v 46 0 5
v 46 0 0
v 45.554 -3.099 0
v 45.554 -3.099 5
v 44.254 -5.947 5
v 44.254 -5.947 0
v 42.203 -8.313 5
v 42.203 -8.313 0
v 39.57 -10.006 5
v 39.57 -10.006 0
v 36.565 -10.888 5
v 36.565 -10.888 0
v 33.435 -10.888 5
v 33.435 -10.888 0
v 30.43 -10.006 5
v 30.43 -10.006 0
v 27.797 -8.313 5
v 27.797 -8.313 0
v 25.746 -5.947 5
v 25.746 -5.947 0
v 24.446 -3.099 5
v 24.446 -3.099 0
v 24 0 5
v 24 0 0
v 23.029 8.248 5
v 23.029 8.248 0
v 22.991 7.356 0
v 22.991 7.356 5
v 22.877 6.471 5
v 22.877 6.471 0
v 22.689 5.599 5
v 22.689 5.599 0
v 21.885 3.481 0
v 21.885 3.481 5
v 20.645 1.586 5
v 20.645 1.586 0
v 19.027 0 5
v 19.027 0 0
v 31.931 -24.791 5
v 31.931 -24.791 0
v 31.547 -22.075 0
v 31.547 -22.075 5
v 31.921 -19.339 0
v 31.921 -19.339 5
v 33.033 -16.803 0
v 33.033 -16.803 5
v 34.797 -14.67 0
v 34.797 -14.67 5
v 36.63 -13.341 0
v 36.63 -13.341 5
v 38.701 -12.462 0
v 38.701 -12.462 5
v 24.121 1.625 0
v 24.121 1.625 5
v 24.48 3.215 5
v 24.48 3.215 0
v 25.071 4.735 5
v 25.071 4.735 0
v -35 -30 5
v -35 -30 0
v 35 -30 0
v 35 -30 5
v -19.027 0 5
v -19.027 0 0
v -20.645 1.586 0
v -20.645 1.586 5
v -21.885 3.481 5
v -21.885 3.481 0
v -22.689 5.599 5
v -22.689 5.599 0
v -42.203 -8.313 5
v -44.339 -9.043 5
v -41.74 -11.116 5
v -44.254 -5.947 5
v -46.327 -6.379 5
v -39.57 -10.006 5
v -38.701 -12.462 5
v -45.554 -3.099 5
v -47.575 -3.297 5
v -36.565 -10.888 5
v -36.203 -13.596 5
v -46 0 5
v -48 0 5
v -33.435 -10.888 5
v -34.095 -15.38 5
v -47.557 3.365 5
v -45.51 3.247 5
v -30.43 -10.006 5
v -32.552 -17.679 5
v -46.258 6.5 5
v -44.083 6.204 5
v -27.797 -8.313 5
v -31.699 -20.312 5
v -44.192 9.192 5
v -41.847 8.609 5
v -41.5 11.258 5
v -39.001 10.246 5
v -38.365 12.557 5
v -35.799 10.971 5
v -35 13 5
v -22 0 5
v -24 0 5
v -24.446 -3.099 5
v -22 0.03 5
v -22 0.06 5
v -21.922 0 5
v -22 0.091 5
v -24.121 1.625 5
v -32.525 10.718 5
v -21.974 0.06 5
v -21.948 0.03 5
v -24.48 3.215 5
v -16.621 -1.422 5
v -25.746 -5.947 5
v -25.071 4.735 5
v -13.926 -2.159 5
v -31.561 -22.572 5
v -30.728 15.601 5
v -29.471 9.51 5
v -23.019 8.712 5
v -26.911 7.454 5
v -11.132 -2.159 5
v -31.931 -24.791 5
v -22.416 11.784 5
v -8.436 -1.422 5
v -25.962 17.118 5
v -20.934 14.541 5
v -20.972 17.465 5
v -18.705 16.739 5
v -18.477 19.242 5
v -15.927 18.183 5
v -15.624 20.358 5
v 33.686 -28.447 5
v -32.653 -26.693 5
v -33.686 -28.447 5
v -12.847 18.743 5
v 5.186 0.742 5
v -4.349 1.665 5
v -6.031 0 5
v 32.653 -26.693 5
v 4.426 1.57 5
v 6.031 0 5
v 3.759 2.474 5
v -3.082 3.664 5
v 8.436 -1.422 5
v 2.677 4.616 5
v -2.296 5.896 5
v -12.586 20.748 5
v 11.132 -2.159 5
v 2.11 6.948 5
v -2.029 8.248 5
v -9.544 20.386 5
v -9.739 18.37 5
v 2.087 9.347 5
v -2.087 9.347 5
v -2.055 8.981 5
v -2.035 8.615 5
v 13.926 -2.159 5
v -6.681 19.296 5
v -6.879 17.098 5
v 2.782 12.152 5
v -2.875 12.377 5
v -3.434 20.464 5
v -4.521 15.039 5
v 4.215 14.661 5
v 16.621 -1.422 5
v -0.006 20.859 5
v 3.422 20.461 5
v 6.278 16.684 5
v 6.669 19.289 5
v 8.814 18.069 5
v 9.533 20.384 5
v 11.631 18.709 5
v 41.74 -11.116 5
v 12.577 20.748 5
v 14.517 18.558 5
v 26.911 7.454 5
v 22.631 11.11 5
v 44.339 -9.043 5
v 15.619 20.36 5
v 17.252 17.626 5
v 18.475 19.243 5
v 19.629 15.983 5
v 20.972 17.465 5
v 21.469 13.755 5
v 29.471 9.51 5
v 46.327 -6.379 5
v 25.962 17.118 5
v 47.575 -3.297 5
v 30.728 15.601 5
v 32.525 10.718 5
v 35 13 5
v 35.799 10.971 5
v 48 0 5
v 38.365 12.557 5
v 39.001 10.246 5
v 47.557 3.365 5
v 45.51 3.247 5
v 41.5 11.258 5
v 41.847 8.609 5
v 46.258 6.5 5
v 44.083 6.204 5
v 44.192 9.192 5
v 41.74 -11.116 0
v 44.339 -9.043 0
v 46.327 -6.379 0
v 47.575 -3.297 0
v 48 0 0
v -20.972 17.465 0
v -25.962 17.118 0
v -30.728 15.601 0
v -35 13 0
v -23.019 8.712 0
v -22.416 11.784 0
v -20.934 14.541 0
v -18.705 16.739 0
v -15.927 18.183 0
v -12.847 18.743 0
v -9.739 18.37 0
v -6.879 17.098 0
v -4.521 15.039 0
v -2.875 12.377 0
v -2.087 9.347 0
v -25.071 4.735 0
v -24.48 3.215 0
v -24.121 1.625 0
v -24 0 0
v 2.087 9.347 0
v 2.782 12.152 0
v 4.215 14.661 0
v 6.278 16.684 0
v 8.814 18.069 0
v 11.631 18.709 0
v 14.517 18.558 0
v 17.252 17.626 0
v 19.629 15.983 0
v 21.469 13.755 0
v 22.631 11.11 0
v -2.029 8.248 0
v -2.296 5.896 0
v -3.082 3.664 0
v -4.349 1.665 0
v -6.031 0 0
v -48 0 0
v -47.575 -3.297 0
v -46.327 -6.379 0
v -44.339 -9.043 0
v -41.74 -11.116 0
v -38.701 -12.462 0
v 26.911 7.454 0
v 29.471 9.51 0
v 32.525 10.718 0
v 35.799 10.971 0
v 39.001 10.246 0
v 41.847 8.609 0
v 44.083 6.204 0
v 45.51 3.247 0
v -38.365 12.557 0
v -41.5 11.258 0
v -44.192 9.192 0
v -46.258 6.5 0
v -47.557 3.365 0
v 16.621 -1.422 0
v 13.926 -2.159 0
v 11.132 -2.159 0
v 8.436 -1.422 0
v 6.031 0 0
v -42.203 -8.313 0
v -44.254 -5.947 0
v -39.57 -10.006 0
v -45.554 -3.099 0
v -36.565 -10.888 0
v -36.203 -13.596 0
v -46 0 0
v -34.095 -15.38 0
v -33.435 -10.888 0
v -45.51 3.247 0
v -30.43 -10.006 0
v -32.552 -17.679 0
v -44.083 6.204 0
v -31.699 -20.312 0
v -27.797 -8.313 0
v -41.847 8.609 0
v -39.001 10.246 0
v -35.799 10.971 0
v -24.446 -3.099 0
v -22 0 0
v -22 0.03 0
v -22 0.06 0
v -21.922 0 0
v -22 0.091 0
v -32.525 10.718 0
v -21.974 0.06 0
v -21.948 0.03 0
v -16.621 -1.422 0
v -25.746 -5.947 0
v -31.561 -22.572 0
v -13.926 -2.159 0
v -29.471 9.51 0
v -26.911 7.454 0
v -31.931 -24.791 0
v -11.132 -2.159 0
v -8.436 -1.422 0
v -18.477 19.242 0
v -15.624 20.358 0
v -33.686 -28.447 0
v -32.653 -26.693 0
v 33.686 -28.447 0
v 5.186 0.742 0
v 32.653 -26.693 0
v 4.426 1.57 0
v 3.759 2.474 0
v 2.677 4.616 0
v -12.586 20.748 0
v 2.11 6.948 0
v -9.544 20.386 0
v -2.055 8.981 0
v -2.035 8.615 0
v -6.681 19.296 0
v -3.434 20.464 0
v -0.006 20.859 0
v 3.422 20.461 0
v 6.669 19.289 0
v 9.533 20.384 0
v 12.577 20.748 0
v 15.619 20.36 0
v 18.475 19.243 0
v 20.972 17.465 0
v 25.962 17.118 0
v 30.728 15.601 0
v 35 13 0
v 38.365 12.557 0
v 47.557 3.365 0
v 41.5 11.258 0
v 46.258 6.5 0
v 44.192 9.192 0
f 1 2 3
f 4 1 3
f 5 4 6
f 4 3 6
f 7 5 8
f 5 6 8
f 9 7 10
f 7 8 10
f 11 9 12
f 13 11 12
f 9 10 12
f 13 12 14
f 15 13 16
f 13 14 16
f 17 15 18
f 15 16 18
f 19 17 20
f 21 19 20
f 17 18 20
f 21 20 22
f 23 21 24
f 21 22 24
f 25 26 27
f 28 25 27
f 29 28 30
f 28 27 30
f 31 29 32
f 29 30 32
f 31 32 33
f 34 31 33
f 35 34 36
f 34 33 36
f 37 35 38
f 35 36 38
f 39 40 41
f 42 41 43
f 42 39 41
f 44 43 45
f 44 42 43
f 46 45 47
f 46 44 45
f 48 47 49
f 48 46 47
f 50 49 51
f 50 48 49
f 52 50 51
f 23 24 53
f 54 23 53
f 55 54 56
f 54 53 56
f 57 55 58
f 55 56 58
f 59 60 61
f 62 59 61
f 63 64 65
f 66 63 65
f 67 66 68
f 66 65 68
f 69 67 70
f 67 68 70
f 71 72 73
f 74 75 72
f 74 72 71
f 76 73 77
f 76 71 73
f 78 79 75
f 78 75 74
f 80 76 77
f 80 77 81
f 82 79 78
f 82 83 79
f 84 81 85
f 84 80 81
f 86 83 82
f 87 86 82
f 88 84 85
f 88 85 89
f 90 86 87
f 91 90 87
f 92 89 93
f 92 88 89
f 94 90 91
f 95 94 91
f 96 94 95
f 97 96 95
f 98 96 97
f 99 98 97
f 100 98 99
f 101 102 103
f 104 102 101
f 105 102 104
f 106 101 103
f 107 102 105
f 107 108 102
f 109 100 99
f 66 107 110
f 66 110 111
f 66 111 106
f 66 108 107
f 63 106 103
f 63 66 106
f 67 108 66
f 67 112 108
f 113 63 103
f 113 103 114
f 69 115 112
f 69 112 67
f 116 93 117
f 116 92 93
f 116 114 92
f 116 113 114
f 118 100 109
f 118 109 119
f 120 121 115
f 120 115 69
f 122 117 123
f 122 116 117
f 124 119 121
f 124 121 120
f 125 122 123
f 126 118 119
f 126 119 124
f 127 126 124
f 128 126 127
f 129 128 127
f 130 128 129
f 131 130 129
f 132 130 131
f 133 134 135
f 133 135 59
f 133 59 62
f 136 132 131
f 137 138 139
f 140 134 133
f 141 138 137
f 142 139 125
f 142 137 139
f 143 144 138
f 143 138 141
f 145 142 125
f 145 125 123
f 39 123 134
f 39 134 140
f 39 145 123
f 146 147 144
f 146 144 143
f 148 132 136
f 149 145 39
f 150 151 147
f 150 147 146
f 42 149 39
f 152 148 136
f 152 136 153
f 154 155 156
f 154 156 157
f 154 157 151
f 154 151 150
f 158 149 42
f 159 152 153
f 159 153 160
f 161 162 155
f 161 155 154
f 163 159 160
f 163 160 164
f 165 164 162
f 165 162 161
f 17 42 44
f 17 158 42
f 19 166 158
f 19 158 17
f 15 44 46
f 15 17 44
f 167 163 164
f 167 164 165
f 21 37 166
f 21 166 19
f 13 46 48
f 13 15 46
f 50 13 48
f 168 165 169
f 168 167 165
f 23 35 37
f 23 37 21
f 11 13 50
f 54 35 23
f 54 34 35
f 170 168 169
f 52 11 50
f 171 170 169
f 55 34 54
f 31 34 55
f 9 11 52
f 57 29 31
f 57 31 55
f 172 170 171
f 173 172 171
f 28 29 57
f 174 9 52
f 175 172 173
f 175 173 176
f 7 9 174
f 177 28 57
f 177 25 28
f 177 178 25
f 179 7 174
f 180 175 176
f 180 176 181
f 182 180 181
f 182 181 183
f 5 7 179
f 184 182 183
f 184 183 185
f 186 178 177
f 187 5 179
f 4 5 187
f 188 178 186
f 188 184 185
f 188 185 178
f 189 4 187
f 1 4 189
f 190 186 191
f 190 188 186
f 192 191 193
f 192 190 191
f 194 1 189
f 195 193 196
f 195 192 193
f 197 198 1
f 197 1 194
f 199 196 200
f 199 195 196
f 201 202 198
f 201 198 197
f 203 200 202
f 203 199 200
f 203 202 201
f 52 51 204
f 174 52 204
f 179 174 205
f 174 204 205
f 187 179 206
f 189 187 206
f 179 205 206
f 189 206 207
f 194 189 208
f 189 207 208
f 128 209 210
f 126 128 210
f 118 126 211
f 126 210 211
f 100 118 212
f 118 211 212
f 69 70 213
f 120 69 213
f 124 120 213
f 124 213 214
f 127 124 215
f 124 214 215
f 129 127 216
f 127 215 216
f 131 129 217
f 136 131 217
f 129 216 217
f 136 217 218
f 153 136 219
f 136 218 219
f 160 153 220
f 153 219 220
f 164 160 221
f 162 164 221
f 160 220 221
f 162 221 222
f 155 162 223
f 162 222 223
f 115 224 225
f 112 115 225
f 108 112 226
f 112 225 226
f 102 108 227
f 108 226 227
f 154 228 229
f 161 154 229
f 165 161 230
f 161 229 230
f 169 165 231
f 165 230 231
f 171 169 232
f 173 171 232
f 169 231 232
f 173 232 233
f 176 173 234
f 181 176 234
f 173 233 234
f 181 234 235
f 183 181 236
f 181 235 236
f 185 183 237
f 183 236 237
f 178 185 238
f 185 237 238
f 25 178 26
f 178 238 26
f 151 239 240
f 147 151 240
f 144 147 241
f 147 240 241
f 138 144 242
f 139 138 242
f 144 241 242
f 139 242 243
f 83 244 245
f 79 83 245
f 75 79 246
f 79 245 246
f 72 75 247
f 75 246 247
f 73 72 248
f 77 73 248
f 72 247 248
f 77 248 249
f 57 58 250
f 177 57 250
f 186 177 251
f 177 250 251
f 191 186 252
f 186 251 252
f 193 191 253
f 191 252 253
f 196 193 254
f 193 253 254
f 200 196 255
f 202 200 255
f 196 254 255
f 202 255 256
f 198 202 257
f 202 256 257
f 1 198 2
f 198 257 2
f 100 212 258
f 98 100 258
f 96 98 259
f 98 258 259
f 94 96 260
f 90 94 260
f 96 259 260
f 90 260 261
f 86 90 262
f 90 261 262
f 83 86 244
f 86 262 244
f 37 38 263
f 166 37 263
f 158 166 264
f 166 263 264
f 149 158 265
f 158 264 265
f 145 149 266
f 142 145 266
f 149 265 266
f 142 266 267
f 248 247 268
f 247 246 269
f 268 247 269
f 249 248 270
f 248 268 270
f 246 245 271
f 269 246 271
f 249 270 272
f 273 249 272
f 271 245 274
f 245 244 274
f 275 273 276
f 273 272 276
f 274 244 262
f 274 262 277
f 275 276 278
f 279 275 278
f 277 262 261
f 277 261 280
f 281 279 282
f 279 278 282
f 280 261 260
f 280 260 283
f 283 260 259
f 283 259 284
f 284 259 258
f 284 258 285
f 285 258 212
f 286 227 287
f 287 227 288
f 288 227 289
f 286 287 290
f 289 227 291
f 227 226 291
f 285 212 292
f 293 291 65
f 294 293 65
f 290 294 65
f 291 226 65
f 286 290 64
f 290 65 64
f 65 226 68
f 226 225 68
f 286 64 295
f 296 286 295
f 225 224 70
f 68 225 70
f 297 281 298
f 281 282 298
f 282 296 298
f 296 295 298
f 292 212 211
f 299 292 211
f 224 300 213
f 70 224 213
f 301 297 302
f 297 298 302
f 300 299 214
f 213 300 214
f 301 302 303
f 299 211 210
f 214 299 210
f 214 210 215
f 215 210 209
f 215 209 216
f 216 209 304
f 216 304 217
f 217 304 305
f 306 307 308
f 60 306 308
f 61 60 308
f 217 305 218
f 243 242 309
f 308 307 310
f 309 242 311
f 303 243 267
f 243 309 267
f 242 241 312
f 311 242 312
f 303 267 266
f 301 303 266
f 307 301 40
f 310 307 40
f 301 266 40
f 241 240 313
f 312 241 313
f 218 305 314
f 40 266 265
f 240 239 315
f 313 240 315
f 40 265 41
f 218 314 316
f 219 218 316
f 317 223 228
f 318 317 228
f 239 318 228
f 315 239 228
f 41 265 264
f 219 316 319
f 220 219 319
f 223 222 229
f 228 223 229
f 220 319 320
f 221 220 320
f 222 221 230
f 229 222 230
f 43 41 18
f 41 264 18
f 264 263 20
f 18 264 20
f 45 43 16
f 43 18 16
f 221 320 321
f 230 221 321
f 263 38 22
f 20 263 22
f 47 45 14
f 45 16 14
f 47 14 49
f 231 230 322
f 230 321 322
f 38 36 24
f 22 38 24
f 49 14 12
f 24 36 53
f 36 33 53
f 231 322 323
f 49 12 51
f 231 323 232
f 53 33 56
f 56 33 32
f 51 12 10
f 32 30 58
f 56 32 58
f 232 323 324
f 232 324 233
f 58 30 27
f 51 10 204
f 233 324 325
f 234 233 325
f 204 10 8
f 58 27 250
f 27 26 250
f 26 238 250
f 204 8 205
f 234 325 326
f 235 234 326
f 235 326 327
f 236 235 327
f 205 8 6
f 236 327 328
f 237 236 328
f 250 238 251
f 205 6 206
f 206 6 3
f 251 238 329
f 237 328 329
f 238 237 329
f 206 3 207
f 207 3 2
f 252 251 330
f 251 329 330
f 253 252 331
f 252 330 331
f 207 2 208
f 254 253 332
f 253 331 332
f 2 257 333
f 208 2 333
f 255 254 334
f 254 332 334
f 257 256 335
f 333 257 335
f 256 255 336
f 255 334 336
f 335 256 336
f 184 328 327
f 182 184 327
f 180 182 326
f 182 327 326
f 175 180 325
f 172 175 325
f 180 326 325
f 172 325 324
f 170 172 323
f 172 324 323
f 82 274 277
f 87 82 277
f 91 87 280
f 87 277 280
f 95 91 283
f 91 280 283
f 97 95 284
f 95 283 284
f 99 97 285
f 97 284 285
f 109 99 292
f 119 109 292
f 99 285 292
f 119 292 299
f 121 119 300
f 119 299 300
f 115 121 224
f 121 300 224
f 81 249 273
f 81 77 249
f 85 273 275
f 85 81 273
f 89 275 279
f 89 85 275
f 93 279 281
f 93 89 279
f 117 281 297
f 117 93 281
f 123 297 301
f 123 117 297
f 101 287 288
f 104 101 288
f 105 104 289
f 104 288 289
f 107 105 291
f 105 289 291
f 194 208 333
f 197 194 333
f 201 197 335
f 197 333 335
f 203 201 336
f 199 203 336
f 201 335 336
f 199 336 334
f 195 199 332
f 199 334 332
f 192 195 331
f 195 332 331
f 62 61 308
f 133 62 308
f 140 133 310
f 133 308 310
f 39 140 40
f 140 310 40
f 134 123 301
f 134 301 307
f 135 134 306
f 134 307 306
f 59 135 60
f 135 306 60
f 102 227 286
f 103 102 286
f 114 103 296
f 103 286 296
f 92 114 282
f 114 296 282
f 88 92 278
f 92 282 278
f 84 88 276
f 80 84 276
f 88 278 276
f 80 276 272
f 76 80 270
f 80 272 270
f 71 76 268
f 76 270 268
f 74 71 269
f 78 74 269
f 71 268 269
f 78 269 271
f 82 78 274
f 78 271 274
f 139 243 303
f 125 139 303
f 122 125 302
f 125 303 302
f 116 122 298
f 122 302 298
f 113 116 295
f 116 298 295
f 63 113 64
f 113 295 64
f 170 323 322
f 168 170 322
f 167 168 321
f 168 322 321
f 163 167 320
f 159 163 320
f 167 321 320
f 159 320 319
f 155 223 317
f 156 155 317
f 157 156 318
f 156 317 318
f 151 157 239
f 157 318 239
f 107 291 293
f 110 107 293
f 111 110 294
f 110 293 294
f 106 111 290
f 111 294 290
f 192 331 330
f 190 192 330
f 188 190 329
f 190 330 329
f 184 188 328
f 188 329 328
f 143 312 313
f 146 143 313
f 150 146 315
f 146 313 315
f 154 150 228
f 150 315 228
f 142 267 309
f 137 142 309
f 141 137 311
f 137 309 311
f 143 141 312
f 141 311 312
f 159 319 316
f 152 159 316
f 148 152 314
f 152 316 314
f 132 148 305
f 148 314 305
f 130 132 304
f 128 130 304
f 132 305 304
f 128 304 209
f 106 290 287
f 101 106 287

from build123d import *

# Parameters (mm, degrees)
F1_DEPTH = 5
F2_R     = 10


with BuildPart() as f1:
    # F0 (on Top) → F1 (new body)
    with BuildSketch(Plane.XY):
        with BuildLine():
            Line((-21.9215769197, 0), (-22, 0))
            ThreePointArc((-22, 0), (-25.8076118446, -9.1923881554), (-35, -13))
            ThreePointArc((-35, -13), (-31.470537173, -21.5), (-35, -30))
            Line((-35, -30), (0, -30))
            Line((0, -30), (0, 0))
            Line((0, 0), (-3.1361794935, 0))
            ThreePointArc((-3.1361794935, 0), (-12.5288782066, -4.2521390116), (-21.9215769197, 0))
        make_face()
        with BuildLine():
            Line((3.1361794935, 0), (0, 0))
            Line((0, 0), (0, -30))
            Line((0, -30), (35, -30))
            ThreePointArc((35, -30), (31.470537173, -21.5), (35, -13))
            ThreePointArc((35, -13), (25.8076118446, -9.1923881554), (22, 0))
            Line((22, 0), (21.9215769197, 0))
            ThreePointArc((21.9215769197, 0), (12.5288782066, -4.2521390116), (3.1361794935, 0))
        make_face()
        with BuildLine():
            Line((6.0309716887, 0), (3.1361794935, 0))
            ThreePointArc((3.1361794935, 0), (12.5288782066, -4.2521390116), (21.9215769197, 0))
            Line((21.9215769197, 0), (19.0267847245, 0))
            ThreePointArc((19.0267847245, 0), (12.5288782066, -2.2521390116), (6.0309716887, 0))
        make_face()
        with BuildLine():
            ThreePointArc((22, 0), (25.8076118446, -9.1923881554), (35, -13))
            ThreePointArc((35, -13), (44.1923881554, -9.1923881554), (48, 0))
            Line((48, 0), (46, 0))
            ThreePointArc((46, 0), (35, -11), (24, 0))
            Line((24, 0), (22, 0))
        make_face()
        with BuildLine():
            ThreePointArc((22.0003152946, 0.0905403813), (22.0000788239, 0.0452704651), (22, 0))
            Line((22, 0), (24, 0))
            ThreePointArc((24, 0), (24.2710977156, 2.427067319), (25.071028322, 4.7345032915))
            ThreePointArc((25.071028322, 4.7345032915), (24.8247656549, 4.828439536), (24.5781510368, 4.9214478657))
            ThreePointArc((24.5781510368, 4.9214478657), (23.5570084029, 2.3631057367), (22.0003152946, 0.0905403813))
        make_face()
        with BuildLine():
            Line((46, 0), (48, 0))
            ThreePointArc((48, 0), (44.1923881554, 9.1923881554), (35, 13))
            ThreePointArc((35, 13), (29.4968686843, 11.777756396), (25.0285322998, 8.3408531881))
            ThreePointArc((25.0285322998, 8.3408531881), (25.0287917296, 8.2943574099), (25.0288782066, 8.2478609884))
            ThreePointArc((25.0288782066, 8.2478609884), (24.9156838961, 6.5694555514), (24.5781510368, 4.9214478657))
            ThreePointArc((24.5781510368, 4.9214478657), (24.8247656549, 4.828439536), (25.071028322, 4.7345032915))
            ThreePointArc((25.071028322, 4.7345032915), (37.427067319, 10.7289022844), (46, 0))
        make_face()
        with BuildLine():
            ThreePointArc((4.0852755238, 17.4649957783), (1.3274413149, 13.7956363589), (0.0800875764, 9.3781759206))
            ThreePointArc((0.0800875764, 9.3781759206), (1.0834439902, 9.3698365837), (2.0865777909, 9.3471162034))
            ThreePointArc((2.0865777909, 9.3471162034), (13.0792624519, 18.7334261703), (23.0288782066, 8.2478609884))
            ThreePointArc((23.0288782066, 8.2478609884), (22.9436323297, 6.9126094932), (22.6892788627, 5.5990388902))
            ThreePointArc((22.6892788627, 5.5990388902), (22.9381719558, 5.5132371757), (23.1867405922, 5.4264999921))
            ThreePointArc((23.1867405922, 5.4264999921), (24.0105984044, 6.9450019849), (25.0285322998, 8.3408531881))
            ThreePointArc((25.0285322998, 8.3408531881), (23.9511150978, 13.3255085147), (20.9724808894, 17.4649957783))
            ThreePointArc((20.9724808894, 17.4649957783), (14.1100835277, 20.6474492773), (6.6686309887, 19.2890340486))
            ThreePointArc((6.6686309887, 19.2890340486), (5.3190370573, 18.4590406755), (4.0852755238, 17.4649957783))
        make_face()
        with BuildLine():
            ThreePointArc((0.0800875764, 9.3781759206), (0.4046589524, 5.2059360263), (2.0881463678, 1.3746434981))
            Line((2.0881463678, 1.3746434981), (3.758663462, 2.4743582965))
            ThreePointArc((3.758663462, 2.4743582965), (2.3264821641, 5.7657016479), (2.0865777909, 9.3471162034))
            ThreePointArc((2.0865777909, 9.3471162034), (1.0834439902, 9.3698365837), (0.0800875764, 9.3781759206))
        make_face()
        with BuildLine():
            ThreePointArc((2.0881463678, 1.3746434981), (2.5883725328, 0.6691838645), (3.1361794935, 0))
            Line((3.1361794935, 0), (6.0309716887, 0))
            ThreePointArc((6.0309716887, 0), (4.7952184024, 1.1457130011), (3.758663462, 2.4743582965))
            Line((3.758663462, 2.4743582965), (2.0881463678, 1.3746434981))
        make_face()
        with BuildLine():
            Line((19.0267847245, 0), (21.9215769197, 0))
            ThreePointArc((21.9215769197, 0), (21.961054746, 0.0451757129), (22.0003152946, 0.0905403813))
            ThreePointArc((22.0003152946, 0.0905403813), (22.3098989313, 2.8215837515), (23.1867405922, 5.4264999921))
            ThreePointArc((23.1867405922, 5.4264999921), (22.9381719558, 5.5132371757), (22.6892788627, 5.5990388902))
            ThreePointArc((22.6892788627, 5.5990388902), (21.3159202914, 2.500001265), (19.0267847245, 0))
        make_face()
        with BuildLine():
            ThreePointArc((23.1867405922, 5.4264999921), (22.3098989313, 2.8215837515), (22.0003152946, 0.0905403813))
            ThreePointArc((22.0003152946, 0.0905403813), (23.5570084029, 2.3631057367), (24.5781510368, 4.9214478657))
            ThreePointArc((24.5781510368, 4.9214478657), (23.8837808459, 5.1776519188), (23.1867405922, 5.4264999921))
        make_face()
        with BuildLine():
            ThreePointArc((23.1867405922, 5.4264999921), (23.8837808459, 5.1776519188), (24.5781510368, 4.9214478657))
            ThreePointArc((24.5781510368, 4.9214478657), (24.9156838961, 6.5694555514), (25.0288782066, 8.2478609884))
            ThreePointArc((25.0288782066, 8.2478609884), (25.0287917296, 8.2943574099), (25.0285322998, 8.3408531881))
            ThreePointArc((25.0285322998, 8.3408531881), (24.0105984044, 6.9450019849), (23.1867405922, 5.4264999921))
        make_face()
        with BuildLine():
            ThreePointArc((22.0003152946, 0.0905403813), (21.961054746, 0.0451757129), (21.9215769197, 0))
            Line((21.9215769197, 0), (22, 0))
            ThreePointArc((22, 0), (22.0000788239, 0.0452704651), (22.0003152946, 0.0905403813))
        make_face()
        with BuildLine():
            ThreePointArc((-0.0288782066, 8.2478609884), (-0.8314696493, 3.8409762562), (-3.1361794935, 0))
            Line((-3.1361794935, 0), (0, 0))
            Line((0, 0), (0, 9.3782217351))
            ThreePointArc((0, 9.3782217351), (-0.0400437948, 9.3782102815), (-0.0800875764, 9.3781759206))
            ThreePointArc((-0.0800875764, 9.3781759206), (-0.0416871118, 8.8135981725), (-0.0288782066, 8.2478609884))
        make_face()
        with BuildLine():
            Line((0, 9.3782217351), (0, 0))
            Line((0, 0), (2.0881463678, 1.3746434981))
            ThreePointArc((2.0881463678, 1.3746434981), (0.4046589524, 5.2059360263), (0.0800875764, 9.3781759206))
            ThreePointArc((0.0800875764, 9.3781759206), (0.0400437948, 9.3782102815), (0, 9.3782217351))
        make_face()
        with BuildLine():
            Line((2.0881463678, 1.3746434981), (0, 0))
            Line((0, 0), (3.1361794935, 0))
            ThreePointArc((3.1361794935, 0), (2.5883725328, 0.6691838645), (2.0881463678, 1.3746434981))
        make_face()
        with BuildLine():
            Line((-6.0309716887, 0), (-3.1361794935, 0))
            ThreePointArc((-3.1361794935, 0), (-0.8314696493, 3.8409762562), (-0.0288782066, 8.2478609884))
            ThreePointArc((-0.0288782066, 8.2478609884), (-0.0416871118, 8.8135981725), (-0.0800875764, 9.3781759206))
            ThreePointArc((-0.0800875764, 9.3781759206), (-1.0834439902, 9.3698365837), (-2.0865777909, 9.3471162034))
            ThreePointArc((-2.0865777909, 9.3471162034), (-2.0433130248, 8.7982452337), (-2.0288782066, 8.2478609884))
            ThreePointArc((-2.0288782066, 8.2478609884), (-3.0822381045, 3.6640862578), (-6.0309716887, 0))
        make_face()
        with BuildLine():
            Line((-19.0267847245, 0), (-21.9215769197, 0))
            ThreePointArc((-21.9215769197, 0), (-12.5288782066, -4.2521390116), (-3.1361794935, 0))
            Line((-3.1361794935, 0), (-6.0309716887, 0))
            ThreePointArc((-6.0309716887, 0), (-12.5288782066, -2.2521390116), (-19.0267847245, 0))
        make_face()
        with BuildLine():
            ThreePointArc((-25.0285322998, 8.3408531881), (-24.0105984044, 6.9450019849), (-23.1867405922, 5.4264999921))
            ThreePointArc((-23.1867405922, 5.4264999921), (-22.9381719558, 5.5132371757), (-22.6892788627, 5.5990388902))
            ThreePointArc((-22.6892788627, 5.5990388902), (-14.4082099376, 18.5783068764), (-2.0865777909, 9.3471162034))
            ThreePointArc((-2.0865777909, 9.3471162034), (-1.0834439902, 9.3698365837), (-0.0800875764, 9.3781759206))
            ThreePointArc((-0.0800875764, 9.3781759206), (-1.3274413149, 13.7956363589), (-4.0852755238, 17.4649957783))
            ThreePointArc((-4.0852755238, 17.4649957783), (-5.3248760335, 18.4631609199), (-6.6812594387, 19.295727513))
            ThreePointArc((-6.6812594387, 19.295727513), (-14.1171721947, 20.6465432655), (-20.9724808894, 17.4649957783))
            ThreePointArc((-20.9724808894, 17.4649957783), (-23.9511150978, 13.3255085147), (-25.0285322998, 8.3408531881))
        make_face()
        with BuildLine():
            ThreePointArc((-22.0003152946, 0.0905403813), (-21.961054746, 0.0451757129), (-21.9215769197, 0))
            Line((-21.9215769197, 0), (-19.0267847245, 0))
            ThreePointArc((-19.0267847245, 0), (-21.3159202914, 2.500001265), (-22.6892788627, 5.5990388902))
            ThreePointArc((-22.6892788627, 5.5990388902), (-22.9381719558, 5.5132371757), (-23.1867405922, 5.4264999921))
            ThreePointArc((-23.1867405922, 5.4264999921), (-22.3098989313, 2.8215837515), (-22.0003152946, 0.0905403813))
        make_face()
        with BuildLine():
            ThreePointArc((-24.5781510368, 4.9214478657), (-23.5570084029, 2.3631057367), (-22.0003152946, 0.0905403813))
            ThreePointArc((-22.0003152946, 0.0905403813), (-22.3098989313, 2.8215837515), (-23.1867405922, 5.4264999921))
            ThreePointArc((-23.1867405922, 5.4264999921), (-23.8837808459, 5.1776519188), (-24.5781510368, 4.9214478657))
        make_face()
        with BuildLine():
            ThreePointArc((-24.5781510368, 4.9214478657), (-23.8837808459, 5.1776519188), (-23.1867405922, 5.4264999921))
            ThreePointArc((-23.1867405922, 5.4264999921), (-24.0105984044, 6.9450019849), (-25.0285322998, 8.3408531881))
            ThreePointArc((-25.0285322998, 8.3408531881), (-24.9218413899, 6.6155425339), (-24.5781510368, 4.9214478657))
        make_face()
        with BuildLine():
            ThreePointArc((-46, 0), (-37.427067319, 10.7289022844), (-25.071028322, 4.7345032915))
            ThreePointArc((-25.071028322, 4.7345032915), (-24.8247656549, 4.828439536), (-24.5781510368, 4.9214478657))
            ThreePointArc((-24.5781510368, 4.9214478657), (-24.9218413899, 6.6155425339), (-25.0285322998, 8.3408531881))
            ThreePointArc((-25.0285322998, 8.3408531881), (-29.4968686843, 11.777756396), (-35, 13))
            ThreePointArc((-35, 13), (-44.1923881554, 9.1923881554), (-48, 0))
            Line((-48, 0), (-46, 0))
        make_face()
        with BuildLine():
            ThreePointArc((-35, -13), (-25.8076118446, -9.1923881554), (-22, 0))
            Line((-22, 0), (-24, 0))
            ThreePointArc((-24, 0), (-35, -11), (-46, 0))
            Line((-46, 0), (-48, 0))
            ThreePointArc((-48, 0), (-44.1923881554, -9.1923881554), (-35, -13))
        make_face()
        with BuildLine():
            Line((-24, 0), (-22, 0))
            ThreePointArc((-22, 0), (-22.0000788239, 0.0452704651), (-22.0003152946, 0.0905403813))
            ThreePointArc((-22.0003152946, 0.0905403813), (-23.5570084029, 2.3631057367), (-24.5781510368, 4.9214478657))
            ThreePointArc((-24.5781510368, 4.9214478657), (-24.8247656549, 4.828439536), (-25.071028322, 4.7345032915))
            ThreePointArc((-25.071028322, 4.7345032915), (-24.2710977156, 2.427067319), (-24, 0))
        make_face()
        with BuildLine():
            ThreePointArc((-0.0800875764, 9.3781759206), (-0.0400437948, 9.3782102815), (0, 9.3782217351))
            ThreePointArc((0, 9.3782217351), (0.0400437948, 9.3782102815), (0.0800875764, 9.3781759206))
            ThreePointArc((0.0800875764, 9.3781759206), (1.3274413149, 13.7956363589), (4.0852755238, 17.4649957783))
            ThreePointArc((4.0852755238, 17.4649957783), (0, 18.0320292124), (-4.0852755238, 17.4649957783))
            ThreePointArc((-4.0852755238, 17.4649957783), (-1.3274413149, 13.7956363589), (-0.0800875764, 9.3781759206))
        make_face()
        with BuildLine():
            ThreePointArc((35, 13), (28.3903016202, 16.5019225745), (20.9724808894, 17.4649957783))
            ThreePointArc((20.9724808894, 17.4649957783), (23.9511150978, 13.3255085147), (25.0285322998, 8.3408531881))
            ThreePointArc((25.0285322998, 8.3408531881), (29.4968686843, 11.777756396), (35, 13))
        make_face()
        with BuildLine():
            ThreePointArc((-20.9724808894, 17.4649957783), (-28.3903016202, 16.5019225745), (-35, 13))
            ThreePointArc((-35, 13), (-29.4968686843, 11.777756396), (-25.0285322998, 8.3408531881))
            ThreePointArc((-25.0285322998, 8.3408531881), (-23.9511150978, 13.3255085147), (-20.9724808894, 17.4649957783))
        make_face()
        with BuildLine():
            ThreePointArc((-6.6812594387, 19.295727513), (-5.3248760335, 18.4631609199), (-4.0852755238, 17.4649957783))
            ThreePointArc((-4.0852755238, 17.4649957783), (0, 18.0320292124), (4.0852755238, 17.4649957783))
            ThreePointArc((4.0852755238, 17.4649957783), (5.3190370573, 18.4590406755), (6.6686309887, 19.2890340486))
            ThreePointArc((6.6686309887, 19.2890340486), (-0.0055285439, 20.859395242), (-6.6812594387, 19.295727513))
        make_face()
    extrude(amount=F1_DEPTH)

    # F2
    f2_edges = [f1.edges().sort_by_distance(p)[0] for p in [
        (-35, -13, 2.5),
        (35, -13, 2.5),
    ]]
    fillet(f2_edges, radius=F2_R)


solid = f1.part
